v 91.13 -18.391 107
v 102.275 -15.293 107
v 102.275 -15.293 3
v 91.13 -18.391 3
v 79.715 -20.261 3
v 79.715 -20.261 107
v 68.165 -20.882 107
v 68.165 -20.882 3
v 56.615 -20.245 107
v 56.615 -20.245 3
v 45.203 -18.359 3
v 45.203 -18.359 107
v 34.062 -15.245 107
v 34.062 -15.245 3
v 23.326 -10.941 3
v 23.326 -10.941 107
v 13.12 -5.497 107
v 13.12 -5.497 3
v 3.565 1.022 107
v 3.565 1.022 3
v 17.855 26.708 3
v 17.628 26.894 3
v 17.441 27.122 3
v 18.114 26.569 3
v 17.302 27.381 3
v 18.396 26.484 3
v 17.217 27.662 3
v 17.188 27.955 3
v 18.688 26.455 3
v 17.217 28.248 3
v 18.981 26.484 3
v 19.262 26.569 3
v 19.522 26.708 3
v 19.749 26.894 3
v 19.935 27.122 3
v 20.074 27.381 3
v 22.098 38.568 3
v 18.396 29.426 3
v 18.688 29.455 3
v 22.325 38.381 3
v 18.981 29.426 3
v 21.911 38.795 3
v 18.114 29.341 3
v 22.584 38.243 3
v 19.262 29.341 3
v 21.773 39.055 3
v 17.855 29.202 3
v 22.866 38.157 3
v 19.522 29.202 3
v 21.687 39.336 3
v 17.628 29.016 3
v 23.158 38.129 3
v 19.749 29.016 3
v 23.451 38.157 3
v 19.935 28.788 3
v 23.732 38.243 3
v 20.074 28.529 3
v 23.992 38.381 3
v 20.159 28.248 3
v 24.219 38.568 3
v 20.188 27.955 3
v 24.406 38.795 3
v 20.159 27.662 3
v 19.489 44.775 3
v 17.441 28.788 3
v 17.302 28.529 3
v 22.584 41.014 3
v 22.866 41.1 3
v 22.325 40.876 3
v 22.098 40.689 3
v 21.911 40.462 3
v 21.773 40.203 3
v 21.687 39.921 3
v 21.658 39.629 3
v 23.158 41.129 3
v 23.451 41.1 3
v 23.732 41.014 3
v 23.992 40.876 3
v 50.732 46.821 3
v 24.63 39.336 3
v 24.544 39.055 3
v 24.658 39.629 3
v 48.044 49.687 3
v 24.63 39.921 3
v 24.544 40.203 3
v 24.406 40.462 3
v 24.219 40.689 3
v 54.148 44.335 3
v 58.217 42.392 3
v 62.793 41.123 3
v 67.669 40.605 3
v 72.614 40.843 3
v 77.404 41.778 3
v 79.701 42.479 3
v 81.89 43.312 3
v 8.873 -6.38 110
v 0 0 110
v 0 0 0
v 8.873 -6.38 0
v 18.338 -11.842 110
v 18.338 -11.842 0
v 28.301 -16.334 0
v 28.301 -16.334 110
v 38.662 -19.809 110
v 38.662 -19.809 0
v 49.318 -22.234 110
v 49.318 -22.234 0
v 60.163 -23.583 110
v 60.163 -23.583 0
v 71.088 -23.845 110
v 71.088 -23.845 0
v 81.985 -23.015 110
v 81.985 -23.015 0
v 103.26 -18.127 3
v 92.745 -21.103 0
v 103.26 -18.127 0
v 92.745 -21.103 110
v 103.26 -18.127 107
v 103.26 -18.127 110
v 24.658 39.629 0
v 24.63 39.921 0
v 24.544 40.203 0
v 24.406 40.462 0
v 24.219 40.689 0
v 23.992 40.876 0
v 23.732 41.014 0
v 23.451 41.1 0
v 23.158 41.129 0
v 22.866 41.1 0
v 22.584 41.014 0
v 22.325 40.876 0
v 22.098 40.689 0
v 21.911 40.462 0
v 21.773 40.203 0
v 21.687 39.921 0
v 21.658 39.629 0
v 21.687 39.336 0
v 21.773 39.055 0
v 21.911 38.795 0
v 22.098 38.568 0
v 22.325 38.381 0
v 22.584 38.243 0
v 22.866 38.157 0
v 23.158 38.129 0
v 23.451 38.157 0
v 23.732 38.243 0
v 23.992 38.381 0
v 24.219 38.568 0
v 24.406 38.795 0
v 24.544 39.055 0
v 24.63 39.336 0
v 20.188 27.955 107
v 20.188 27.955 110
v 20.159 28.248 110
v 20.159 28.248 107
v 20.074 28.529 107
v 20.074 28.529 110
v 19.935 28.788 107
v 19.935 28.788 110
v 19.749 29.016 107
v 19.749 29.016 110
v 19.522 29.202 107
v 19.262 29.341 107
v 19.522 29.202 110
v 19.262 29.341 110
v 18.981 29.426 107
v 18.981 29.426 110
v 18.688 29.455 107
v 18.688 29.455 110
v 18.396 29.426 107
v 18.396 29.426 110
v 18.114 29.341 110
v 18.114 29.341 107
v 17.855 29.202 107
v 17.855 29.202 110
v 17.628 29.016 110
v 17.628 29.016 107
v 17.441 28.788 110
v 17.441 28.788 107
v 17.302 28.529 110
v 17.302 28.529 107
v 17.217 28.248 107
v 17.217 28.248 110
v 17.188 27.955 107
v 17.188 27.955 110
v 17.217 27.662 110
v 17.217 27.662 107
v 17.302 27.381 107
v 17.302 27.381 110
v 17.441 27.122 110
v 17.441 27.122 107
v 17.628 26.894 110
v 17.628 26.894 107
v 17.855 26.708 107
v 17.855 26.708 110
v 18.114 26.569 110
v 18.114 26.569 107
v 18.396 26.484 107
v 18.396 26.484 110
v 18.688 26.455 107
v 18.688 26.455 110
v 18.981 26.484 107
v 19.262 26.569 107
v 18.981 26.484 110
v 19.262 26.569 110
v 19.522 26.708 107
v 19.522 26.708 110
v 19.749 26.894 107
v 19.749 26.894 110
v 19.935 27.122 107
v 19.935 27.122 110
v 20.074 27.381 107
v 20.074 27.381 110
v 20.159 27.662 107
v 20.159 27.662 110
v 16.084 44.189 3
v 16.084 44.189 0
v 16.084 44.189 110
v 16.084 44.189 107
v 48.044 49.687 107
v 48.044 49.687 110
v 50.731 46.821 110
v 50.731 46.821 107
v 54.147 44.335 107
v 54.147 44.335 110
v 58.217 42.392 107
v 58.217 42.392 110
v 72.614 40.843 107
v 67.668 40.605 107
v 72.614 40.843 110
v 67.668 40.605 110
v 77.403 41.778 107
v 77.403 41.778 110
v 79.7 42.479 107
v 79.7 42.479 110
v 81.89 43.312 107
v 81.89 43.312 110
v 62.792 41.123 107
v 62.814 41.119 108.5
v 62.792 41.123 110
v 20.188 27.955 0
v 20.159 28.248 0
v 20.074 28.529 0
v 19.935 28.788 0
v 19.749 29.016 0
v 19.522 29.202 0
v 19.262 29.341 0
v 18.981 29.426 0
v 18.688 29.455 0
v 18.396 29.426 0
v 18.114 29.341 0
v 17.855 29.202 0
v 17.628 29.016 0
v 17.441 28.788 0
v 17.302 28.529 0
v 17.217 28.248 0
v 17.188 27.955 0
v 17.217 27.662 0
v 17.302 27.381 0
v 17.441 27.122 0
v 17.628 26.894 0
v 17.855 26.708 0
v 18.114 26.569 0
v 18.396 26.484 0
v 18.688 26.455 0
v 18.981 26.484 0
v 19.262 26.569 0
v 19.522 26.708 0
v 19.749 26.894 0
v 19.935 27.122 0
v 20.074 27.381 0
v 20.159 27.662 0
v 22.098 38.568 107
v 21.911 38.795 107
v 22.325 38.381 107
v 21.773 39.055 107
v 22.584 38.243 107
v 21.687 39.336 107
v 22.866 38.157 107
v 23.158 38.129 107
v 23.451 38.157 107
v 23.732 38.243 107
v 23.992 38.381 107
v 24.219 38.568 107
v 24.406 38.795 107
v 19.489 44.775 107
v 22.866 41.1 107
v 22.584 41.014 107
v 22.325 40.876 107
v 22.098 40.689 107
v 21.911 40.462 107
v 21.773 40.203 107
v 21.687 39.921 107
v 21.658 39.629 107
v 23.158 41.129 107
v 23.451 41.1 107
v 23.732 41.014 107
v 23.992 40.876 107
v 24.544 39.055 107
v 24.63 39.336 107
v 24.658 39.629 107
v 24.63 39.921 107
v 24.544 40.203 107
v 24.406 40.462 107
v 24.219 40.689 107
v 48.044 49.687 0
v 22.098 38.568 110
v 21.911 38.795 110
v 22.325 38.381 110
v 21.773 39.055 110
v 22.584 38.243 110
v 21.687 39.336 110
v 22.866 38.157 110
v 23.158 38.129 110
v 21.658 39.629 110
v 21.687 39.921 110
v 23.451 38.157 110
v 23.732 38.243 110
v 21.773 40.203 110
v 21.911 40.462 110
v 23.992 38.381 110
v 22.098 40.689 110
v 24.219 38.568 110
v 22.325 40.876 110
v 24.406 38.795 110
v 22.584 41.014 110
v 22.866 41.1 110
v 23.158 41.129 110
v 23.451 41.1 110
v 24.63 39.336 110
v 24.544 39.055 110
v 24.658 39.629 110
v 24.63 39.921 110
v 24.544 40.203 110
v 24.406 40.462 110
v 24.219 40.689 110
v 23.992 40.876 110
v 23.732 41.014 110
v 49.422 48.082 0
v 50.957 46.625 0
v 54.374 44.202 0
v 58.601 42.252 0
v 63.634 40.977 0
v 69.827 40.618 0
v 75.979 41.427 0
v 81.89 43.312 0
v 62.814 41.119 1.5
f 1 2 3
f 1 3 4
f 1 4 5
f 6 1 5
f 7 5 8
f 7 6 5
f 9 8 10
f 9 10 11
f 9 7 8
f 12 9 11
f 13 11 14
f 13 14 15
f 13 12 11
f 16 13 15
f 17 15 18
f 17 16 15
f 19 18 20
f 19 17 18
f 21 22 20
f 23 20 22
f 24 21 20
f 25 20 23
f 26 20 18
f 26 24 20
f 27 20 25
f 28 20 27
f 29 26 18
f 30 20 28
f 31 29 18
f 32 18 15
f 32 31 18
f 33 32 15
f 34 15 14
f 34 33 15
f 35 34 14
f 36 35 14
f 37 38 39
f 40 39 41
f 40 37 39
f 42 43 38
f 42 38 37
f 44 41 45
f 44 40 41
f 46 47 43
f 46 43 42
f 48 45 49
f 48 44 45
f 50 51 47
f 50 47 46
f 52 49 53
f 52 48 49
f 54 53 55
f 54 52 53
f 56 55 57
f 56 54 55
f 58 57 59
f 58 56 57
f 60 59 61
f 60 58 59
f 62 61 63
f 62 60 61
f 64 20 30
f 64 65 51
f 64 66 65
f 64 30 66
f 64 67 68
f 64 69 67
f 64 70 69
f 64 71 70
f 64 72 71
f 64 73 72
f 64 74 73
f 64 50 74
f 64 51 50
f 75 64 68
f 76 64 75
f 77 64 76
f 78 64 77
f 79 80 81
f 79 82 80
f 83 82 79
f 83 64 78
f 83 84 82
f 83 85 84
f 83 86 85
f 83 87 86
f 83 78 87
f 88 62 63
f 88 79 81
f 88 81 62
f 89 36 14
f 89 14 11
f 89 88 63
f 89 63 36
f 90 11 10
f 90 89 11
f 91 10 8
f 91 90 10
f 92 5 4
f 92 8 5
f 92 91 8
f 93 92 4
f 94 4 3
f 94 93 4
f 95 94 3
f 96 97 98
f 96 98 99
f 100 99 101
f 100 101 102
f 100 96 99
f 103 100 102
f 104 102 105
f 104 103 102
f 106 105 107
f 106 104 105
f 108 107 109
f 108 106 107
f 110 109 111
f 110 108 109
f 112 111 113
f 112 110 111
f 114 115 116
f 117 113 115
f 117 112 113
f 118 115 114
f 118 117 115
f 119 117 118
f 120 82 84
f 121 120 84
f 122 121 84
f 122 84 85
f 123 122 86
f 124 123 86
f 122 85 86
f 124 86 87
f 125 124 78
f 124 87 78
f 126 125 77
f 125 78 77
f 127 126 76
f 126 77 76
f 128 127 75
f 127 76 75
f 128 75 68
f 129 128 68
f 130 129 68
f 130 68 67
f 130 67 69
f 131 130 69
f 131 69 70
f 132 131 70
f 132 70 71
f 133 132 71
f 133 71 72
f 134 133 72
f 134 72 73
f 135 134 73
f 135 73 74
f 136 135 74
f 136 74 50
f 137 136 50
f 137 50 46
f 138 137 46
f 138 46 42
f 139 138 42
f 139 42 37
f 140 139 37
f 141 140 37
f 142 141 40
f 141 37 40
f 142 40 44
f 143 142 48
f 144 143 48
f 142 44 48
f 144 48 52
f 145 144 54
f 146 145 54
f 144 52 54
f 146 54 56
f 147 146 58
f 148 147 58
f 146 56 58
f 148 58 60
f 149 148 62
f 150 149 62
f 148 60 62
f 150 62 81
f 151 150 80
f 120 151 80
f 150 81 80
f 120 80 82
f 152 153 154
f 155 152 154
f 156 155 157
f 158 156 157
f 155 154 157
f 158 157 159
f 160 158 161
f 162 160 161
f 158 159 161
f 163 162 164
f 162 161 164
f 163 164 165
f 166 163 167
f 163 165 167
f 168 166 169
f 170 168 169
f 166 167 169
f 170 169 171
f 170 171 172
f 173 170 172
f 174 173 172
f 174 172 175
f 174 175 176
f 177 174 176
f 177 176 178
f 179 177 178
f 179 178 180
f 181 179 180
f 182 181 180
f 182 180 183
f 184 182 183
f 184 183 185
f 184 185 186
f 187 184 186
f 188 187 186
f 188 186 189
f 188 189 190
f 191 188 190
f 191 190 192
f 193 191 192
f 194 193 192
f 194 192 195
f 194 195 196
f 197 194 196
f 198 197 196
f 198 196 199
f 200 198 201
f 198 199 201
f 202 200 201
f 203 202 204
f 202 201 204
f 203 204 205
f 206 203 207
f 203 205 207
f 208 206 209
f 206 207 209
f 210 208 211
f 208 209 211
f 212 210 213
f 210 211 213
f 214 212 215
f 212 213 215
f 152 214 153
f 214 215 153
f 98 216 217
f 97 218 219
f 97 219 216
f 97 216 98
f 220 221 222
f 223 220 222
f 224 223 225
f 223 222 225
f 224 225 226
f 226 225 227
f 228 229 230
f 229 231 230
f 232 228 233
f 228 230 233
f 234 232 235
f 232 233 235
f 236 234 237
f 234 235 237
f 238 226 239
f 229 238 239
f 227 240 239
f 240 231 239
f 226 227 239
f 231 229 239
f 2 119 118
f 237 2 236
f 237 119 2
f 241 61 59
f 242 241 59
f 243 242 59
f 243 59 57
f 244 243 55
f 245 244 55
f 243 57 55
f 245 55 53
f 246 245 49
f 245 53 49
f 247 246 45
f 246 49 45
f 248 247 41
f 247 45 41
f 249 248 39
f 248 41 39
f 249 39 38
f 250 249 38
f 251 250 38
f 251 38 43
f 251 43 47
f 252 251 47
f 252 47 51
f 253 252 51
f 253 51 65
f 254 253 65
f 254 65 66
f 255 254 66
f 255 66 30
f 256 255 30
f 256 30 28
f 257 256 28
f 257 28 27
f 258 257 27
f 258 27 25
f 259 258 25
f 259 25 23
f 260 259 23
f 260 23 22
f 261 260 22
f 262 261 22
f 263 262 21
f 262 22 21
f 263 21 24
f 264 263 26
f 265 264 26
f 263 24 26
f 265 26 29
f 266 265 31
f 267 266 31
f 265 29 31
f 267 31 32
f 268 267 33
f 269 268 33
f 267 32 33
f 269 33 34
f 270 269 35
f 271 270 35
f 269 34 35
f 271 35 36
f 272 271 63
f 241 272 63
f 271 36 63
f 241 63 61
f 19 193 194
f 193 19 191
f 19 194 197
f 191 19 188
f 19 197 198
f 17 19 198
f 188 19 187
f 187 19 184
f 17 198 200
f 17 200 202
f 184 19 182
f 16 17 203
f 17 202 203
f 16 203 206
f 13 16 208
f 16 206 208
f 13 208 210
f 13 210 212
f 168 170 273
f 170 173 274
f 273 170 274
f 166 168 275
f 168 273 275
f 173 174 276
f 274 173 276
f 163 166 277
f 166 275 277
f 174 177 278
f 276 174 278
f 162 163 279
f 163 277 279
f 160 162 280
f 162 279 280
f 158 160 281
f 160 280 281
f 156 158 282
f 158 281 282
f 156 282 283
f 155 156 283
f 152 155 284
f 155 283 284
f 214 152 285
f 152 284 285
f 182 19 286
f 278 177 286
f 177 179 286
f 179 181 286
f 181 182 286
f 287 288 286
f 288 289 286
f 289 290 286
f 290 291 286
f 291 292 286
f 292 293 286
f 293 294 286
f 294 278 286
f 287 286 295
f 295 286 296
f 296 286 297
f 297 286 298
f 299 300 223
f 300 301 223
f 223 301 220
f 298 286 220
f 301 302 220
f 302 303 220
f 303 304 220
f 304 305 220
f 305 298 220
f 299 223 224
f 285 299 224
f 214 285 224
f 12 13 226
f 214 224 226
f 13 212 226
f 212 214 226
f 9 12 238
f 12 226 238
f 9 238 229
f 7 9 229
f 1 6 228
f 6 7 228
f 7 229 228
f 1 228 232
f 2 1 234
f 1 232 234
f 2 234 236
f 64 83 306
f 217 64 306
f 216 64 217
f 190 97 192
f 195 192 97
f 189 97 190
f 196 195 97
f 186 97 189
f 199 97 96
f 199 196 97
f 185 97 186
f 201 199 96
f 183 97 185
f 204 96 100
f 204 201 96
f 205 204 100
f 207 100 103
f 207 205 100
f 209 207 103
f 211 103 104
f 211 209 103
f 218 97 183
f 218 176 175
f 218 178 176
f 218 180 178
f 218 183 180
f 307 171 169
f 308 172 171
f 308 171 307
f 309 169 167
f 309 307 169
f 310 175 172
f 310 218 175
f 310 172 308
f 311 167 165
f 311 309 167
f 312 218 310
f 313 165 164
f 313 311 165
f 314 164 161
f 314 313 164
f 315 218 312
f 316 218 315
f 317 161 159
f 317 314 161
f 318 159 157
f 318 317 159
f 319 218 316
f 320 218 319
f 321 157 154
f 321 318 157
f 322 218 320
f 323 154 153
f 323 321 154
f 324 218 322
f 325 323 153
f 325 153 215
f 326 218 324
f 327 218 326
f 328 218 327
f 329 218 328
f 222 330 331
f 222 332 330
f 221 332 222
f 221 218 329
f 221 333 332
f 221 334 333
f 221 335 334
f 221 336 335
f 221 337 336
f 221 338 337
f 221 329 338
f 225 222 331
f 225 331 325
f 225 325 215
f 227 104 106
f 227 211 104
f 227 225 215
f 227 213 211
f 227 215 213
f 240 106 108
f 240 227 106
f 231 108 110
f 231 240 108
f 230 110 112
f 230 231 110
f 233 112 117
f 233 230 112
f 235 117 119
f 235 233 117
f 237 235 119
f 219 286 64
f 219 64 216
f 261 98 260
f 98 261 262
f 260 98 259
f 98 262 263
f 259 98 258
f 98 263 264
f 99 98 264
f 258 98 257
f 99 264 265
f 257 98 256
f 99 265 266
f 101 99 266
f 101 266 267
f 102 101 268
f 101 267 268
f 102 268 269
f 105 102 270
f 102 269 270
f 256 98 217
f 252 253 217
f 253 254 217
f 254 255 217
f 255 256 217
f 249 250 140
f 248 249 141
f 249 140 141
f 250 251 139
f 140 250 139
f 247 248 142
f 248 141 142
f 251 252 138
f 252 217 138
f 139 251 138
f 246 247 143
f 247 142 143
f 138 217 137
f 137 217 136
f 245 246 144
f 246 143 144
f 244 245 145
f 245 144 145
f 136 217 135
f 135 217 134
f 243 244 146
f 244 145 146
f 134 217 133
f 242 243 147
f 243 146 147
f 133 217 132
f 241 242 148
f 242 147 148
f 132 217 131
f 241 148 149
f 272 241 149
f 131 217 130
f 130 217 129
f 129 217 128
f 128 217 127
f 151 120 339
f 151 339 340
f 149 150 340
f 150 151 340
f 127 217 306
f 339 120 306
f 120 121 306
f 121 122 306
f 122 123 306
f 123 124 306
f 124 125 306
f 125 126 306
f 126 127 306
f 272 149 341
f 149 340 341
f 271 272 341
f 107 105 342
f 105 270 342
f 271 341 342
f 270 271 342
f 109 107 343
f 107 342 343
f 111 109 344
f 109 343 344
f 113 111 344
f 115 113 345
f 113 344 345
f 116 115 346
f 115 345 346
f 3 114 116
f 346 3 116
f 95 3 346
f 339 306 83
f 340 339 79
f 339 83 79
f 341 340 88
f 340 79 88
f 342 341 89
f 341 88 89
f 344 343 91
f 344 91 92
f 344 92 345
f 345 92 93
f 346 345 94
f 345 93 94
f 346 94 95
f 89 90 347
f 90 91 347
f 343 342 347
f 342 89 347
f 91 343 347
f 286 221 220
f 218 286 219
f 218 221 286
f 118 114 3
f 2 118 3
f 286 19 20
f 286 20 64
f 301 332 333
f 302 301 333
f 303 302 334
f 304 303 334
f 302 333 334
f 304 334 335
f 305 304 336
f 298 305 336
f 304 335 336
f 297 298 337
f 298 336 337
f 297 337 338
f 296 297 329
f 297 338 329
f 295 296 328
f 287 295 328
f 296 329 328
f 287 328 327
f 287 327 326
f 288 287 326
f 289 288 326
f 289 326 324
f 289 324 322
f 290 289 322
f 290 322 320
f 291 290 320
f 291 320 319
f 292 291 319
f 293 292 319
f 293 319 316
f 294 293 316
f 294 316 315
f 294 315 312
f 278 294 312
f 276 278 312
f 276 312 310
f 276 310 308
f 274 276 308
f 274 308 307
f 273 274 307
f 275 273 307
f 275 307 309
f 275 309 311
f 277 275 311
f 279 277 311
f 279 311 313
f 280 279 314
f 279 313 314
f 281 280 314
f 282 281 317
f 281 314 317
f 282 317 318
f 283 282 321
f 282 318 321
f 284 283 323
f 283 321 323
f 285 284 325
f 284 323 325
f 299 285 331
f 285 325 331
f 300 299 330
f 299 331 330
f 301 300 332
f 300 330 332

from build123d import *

# Parameters (mm, degrees)
EXTRUDE_1_DEPTH           = 3
EXTRUDE_2_DEPTH           = 104
EXTRUDE_3_DEPTH           = 3
CUT_EXTRUDE_1_DEPTH       = 159.483205287
HOLE_WIZARD_3_0_3_1_D     = 3
HOLE_WIZARD_3_0_3_1_DEPTH = 3
HOLE_WIZARD_3_0_3_2_D     = 3
HOLE_WIZARD_3_0_3_2_DEPTH = 110


with BuildPart() as part:
    # 草图1 → 凸台-拉伸1 (new body)
    with BuildSketch(Plane.XY.offset(110)):
        with BuildLine():
            Line((48.043658488, 49.686561818), (16.083624337, 44.189394688))
            Line((16.083624337, 44.189394688), (0, 0))
            ThreePointArc((0, 0), (49.31823123, -22.233763367), (103.260442774, -18.126942356))
            Line((103.260442774, -18.126942356), (81.890470472, 43.311728011))
            add(Edge.make_bspline(
                [(48.043658488, 49.686561818), (60.031404168, 34.166493651), (81.890470472, 43.311728011)],
                knots=[3.390052137, 3.390052137, 3.390052137, 4.76191312, 4.76191312, 4.76191312], degree=2, weights=[1, 0.773830015, 1]))
        make_face()
    extrude(amount=-EXTRUDE_1_DEPTH)

    # 草图2 → 凸台-拉伸2 (add)
    with BuildSketch(Plane(origin=(0, 0, 107), x_dir=(-1, 0, 0), z_dir=(0, 0, -1))):
        with BuildLine():
            Line((-3.564517285, 1.022017551), (-19.489368658, 44.775187108))
            Line((-19.489368658, 44.775187108), (-16.083624337, 44.189394688))
            Line((-16.083624337, 44.189394688), (0, 0))
            ThreePointArc((0, 0), (-49.31823123, -22.233763367), (-103.260442774, -18.126942356))
            Line((-103.260442774, -18.126942356), (-102.274839972, -15.293334302))
            ThreePointArc((-102.274839972, -15.293334302), (-50.883106444, -19.457225166), (-3.564517285, 1.022017551))
        make_face()
    extrude(amount=EXTRUDE_2_DEPTH)

    # 草图3 → 凸台-拉伸3 (add)
    with BuildSketch(Plane(origin=(0, 0, 3), x_dir=(-1, 0, 0), z_dir=(0, 0, -1))):
        with BuildLine():
            Line((-77.887672968, 54.819770834), (-16.083624337, 44.189394688))
            Line((-16.083624337, 44.189394688), (0, 0))
            ThreePointArc((0, 0), (-49.31823123, -22.233763367), (-103.260442774, -18.126942356))
            Line((-103.260442774, -18.126942356), (-77.887672968, 54.819770834))
        make_face()
    extrude(amount=EXTRUDE_3_DEPTH)

    # 草图4 → 切除-拉伸1 (cut, through all)
    with BuildSketch(Plane.XY.offset(3)):
        with BuildLine():
            Line((77.887672968, 54.819770834), (48.043658488, 49.686561818))
            add(Edge.make_bspline(
                [(48.043658488, 49.686561818), (60.032354081, 34.167172902), (81.890470472, 43.311728011)],
                knots=[3.389784889, 3.389784889, 3.389784889, 4.7613973, 4.7613973, 4.7613973], degree=2, weights=[1, 0.773908731, 1]))
            Line((81.890470472, 43.311728011), (77.887672968, 54.819770834))
        make_face()
    extrude(amount=-CUT_EXTRUDE_1_DEPTH, mode=Mode.SUBTRACT)

    # Ø3.0 (3) 直径孔1
    with Locations(Plane(origin=(0, 0, 107), x_dir=(-1, 0, 0), z_dir=(0, 0, -1))):
        with Locations((-18.688258909, 27.955134161), (-23.158328606, 39.628543128)):
            Hole(HOLE_WIZARD_3_0_3_1_D / 2, depth=HOLE_WIZARD_3_0_3_1_DEPTH)

    # Ø3.0 (3) 直径孔2
    with Locations(Plane(origin=(0, 0, 0), x_dir=(-1, 0, 0), z_dir=(0, 0, -1))):
        with Locations((-18.688258909, 27.955134161), (-23.158328606, 39.628543128)):
            Hole(HOLE_WIZARD_3_0_3_2_D / 2, depth=HOLE_WIZARD_3_0_3_2_DEPTH)


solid = part.part
